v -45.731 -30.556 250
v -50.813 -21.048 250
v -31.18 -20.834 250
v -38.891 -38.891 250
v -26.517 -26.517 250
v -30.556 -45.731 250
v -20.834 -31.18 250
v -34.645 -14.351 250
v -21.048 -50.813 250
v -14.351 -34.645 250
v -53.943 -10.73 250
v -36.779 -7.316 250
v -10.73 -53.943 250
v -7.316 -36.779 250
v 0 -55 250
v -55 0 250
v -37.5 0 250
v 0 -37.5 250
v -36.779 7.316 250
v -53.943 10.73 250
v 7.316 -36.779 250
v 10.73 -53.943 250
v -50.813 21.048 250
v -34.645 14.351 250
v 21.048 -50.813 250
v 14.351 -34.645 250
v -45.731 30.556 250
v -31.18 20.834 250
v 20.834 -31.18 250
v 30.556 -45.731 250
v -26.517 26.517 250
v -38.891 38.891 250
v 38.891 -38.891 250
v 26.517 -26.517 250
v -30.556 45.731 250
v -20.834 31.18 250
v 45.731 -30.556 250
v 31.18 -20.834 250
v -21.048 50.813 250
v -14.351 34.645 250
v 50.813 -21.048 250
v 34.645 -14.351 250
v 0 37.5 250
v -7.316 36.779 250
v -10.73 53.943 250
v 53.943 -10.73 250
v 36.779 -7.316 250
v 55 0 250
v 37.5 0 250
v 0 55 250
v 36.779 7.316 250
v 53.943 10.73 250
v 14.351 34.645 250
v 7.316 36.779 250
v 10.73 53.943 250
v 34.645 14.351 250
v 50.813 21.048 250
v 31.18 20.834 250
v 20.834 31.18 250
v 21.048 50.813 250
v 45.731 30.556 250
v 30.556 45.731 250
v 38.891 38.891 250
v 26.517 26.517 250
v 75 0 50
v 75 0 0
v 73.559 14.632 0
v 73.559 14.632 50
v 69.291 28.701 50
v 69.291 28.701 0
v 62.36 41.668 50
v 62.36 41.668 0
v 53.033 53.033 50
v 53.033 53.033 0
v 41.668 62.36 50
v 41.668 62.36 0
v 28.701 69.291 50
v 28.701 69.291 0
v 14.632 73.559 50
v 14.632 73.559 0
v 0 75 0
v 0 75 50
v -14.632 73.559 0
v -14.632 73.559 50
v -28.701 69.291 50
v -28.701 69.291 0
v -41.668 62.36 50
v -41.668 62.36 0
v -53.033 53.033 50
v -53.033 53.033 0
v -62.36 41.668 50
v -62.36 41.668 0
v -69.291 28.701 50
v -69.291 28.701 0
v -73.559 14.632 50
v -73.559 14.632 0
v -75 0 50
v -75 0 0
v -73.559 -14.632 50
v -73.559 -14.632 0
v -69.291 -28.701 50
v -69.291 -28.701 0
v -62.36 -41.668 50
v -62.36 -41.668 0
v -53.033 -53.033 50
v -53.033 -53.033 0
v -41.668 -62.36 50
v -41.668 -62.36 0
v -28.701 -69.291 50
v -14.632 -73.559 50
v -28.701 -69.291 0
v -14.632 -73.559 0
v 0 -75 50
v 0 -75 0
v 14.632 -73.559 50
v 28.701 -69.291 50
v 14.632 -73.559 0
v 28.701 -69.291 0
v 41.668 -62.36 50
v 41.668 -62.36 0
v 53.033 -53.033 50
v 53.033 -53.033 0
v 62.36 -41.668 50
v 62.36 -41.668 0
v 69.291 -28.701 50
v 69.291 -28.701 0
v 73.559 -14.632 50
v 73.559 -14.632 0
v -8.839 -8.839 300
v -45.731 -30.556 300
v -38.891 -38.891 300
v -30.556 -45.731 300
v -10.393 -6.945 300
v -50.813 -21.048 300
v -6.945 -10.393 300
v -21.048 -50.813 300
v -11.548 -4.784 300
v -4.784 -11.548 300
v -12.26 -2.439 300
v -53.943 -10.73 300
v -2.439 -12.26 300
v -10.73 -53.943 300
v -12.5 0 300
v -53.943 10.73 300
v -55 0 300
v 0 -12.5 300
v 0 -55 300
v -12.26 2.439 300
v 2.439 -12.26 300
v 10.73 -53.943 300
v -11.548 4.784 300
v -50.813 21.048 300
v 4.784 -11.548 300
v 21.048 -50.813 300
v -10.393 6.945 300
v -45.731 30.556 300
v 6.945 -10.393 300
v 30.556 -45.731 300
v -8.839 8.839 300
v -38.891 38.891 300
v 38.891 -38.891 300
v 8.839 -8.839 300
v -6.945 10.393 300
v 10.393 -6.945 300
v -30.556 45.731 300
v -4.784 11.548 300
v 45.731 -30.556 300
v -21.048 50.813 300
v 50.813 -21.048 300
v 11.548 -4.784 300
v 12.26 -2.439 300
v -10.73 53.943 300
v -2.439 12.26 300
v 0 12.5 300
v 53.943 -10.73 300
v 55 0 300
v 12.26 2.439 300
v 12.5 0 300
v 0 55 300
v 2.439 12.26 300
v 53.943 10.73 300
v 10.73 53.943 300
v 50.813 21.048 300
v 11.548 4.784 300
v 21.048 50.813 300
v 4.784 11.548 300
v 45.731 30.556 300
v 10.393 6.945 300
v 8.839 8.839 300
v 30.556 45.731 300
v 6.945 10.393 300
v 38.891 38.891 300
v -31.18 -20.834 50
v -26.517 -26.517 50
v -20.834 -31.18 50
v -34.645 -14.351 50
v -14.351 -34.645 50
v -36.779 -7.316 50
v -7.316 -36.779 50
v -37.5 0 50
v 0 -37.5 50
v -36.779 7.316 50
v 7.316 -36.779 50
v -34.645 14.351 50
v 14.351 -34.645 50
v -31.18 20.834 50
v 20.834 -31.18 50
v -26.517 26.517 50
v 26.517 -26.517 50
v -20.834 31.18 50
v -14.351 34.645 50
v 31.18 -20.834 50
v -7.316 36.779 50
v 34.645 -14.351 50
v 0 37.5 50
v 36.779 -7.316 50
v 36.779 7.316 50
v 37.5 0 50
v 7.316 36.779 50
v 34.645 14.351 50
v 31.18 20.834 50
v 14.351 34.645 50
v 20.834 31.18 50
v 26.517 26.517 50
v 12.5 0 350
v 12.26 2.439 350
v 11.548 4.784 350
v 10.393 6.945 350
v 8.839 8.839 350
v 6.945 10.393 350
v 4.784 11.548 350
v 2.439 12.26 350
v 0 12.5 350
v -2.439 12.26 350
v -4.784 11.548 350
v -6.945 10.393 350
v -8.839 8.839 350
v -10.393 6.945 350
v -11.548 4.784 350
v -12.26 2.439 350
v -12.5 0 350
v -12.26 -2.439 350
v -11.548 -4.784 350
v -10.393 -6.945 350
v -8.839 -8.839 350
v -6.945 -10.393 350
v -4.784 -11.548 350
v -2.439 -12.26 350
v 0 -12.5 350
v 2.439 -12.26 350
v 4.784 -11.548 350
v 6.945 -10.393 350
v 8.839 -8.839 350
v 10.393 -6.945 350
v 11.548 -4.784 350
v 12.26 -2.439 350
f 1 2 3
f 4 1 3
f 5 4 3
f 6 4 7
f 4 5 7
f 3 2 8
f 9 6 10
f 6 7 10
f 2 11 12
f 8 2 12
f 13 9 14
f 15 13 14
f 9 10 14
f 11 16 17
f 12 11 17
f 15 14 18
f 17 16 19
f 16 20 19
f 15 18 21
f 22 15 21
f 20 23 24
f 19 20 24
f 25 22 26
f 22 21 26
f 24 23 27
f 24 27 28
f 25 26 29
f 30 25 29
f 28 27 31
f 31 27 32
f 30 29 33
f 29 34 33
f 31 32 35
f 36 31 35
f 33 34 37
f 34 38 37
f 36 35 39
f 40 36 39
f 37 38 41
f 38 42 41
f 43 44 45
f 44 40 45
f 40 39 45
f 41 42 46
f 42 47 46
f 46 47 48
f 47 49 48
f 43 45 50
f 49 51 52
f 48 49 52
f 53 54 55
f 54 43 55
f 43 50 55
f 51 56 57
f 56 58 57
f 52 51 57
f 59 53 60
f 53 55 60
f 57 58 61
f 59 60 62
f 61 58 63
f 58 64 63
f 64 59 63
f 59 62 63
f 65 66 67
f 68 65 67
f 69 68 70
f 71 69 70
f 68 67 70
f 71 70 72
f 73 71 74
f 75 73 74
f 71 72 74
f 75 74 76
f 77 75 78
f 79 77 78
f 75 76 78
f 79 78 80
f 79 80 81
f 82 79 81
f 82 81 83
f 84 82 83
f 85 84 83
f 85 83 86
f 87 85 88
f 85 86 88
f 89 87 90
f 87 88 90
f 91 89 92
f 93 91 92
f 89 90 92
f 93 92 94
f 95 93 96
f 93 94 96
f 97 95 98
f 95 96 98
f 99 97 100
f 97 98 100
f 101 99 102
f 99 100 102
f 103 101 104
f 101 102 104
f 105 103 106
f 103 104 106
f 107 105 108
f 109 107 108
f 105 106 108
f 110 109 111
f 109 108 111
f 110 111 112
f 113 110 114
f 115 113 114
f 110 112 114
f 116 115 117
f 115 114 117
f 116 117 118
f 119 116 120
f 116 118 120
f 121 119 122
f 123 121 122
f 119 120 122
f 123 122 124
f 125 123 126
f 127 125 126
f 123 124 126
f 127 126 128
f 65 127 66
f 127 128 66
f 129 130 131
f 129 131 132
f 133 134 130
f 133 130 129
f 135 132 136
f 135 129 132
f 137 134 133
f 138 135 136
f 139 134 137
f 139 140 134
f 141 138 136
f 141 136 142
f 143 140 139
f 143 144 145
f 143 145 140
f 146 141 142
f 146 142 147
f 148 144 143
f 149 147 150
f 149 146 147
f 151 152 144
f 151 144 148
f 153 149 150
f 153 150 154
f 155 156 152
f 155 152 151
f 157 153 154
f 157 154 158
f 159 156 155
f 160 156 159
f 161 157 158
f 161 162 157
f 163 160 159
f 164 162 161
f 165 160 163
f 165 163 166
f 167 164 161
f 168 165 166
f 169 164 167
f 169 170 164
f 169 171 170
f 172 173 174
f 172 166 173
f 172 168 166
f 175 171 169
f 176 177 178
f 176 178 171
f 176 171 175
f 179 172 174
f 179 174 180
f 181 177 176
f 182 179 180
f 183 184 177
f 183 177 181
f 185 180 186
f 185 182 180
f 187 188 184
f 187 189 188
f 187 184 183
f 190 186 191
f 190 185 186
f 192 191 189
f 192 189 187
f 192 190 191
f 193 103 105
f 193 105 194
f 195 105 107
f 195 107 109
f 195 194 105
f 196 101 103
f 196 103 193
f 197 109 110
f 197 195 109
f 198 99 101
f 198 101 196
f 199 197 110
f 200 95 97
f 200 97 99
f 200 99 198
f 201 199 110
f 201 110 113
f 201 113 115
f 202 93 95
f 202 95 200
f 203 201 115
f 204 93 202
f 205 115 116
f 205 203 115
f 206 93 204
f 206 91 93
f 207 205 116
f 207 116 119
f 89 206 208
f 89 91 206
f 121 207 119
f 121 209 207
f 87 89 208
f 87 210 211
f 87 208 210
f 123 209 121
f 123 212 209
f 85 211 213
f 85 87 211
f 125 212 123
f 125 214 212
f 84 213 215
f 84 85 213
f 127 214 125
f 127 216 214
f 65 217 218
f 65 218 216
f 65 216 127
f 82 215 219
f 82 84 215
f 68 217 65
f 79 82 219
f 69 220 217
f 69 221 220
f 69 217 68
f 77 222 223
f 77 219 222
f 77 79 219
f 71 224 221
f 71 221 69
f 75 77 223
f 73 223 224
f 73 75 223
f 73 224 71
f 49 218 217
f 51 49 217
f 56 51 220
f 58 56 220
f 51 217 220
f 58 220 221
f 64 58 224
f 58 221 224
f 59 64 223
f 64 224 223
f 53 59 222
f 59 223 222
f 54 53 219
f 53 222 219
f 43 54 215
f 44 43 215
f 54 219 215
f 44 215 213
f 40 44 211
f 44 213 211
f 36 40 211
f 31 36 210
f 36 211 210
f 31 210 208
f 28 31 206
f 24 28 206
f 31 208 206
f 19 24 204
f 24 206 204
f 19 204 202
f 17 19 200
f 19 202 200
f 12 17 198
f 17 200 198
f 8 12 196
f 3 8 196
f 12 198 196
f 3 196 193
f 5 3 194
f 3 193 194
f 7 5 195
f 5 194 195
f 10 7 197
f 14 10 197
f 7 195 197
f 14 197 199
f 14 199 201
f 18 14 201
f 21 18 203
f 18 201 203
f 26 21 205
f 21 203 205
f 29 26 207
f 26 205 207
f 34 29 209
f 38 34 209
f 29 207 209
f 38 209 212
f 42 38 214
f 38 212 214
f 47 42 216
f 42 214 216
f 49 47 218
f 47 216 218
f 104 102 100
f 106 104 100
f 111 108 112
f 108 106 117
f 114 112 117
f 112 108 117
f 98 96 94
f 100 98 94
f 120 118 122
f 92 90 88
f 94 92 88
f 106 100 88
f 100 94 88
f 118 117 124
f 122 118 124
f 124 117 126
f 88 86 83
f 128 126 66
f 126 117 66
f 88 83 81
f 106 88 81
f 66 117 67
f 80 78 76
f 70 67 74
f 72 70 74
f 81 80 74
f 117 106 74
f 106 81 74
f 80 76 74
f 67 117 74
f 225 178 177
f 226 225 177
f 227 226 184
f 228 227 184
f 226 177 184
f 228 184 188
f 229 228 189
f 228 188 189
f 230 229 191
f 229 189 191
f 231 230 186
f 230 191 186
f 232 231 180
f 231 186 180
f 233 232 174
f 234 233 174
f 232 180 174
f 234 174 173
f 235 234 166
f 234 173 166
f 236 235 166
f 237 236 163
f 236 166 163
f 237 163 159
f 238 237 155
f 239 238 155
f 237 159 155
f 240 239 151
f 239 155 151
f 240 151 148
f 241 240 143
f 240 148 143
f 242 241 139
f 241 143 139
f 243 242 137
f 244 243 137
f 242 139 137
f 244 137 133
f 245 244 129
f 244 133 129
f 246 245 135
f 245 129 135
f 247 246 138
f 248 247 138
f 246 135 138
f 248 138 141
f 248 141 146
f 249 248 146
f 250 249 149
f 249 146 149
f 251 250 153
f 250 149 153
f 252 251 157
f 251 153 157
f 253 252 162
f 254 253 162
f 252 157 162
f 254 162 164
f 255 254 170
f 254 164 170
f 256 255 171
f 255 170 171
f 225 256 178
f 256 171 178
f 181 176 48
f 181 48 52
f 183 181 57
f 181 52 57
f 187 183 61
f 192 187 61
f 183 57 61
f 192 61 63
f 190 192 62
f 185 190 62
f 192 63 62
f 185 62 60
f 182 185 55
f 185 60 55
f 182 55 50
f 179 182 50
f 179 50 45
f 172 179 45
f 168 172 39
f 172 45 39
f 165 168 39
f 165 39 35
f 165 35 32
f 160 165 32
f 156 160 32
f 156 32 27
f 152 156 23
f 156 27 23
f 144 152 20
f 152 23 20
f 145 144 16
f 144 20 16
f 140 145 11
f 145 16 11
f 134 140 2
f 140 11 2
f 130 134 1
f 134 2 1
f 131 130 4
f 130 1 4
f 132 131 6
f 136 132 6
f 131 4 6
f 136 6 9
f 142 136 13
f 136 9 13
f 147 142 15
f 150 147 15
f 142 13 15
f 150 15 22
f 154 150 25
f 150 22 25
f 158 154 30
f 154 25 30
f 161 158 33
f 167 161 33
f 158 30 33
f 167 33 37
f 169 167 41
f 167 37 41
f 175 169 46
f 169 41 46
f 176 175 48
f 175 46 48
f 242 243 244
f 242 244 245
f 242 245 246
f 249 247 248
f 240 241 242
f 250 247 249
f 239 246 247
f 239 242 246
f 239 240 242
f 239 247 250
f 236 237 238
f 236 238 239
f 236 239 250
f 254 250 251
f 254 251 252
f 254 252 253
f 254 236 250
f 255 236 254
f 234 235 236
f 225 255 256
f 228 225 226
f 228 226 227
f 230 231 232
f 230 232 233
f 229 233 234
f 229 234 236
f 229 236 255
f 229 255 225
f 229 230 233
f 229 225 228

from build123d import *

# Parameters (mm, degrees)
F0_R     = 75
F1_DEPTH = 50
F2_R     = 37.5
F3_DEPTH = 200
F4_R     = 55
F4_R_2   = 37.5
F5_DEPTH = 50
F6_R     = 12.5
F7_DEPTH = 50


with BuildPart() as f1:
    # F0 (on Top) → F1 (new body)
    with BuildSketch(Plane.XY):
        Circle(F0_R)
    extrude(amount=F1_DEPTH)

    # F2 (on face) → F3 (join)
    with BuildSketch(Plane.XY.offset(50)):
        Circle(F2_R)
    extrude(amount=F3_DEPTH)

    # F4 (on face) → F5 (join)
    with BuildSketch(Plane.XY.offset(250)):
        Circle(F4_R)
        Circle(F4_R_2, mode=Mode.SUBTRACT)
        Circle(F4_R_2)
    extrude(amount=F5_DEPTH)

    # F6 (on face) → F7 (join)
    with BuildSketch(Plane.XY.offset(300)):
        Circle(F6_R)
    extrude(amount=F7_DEPTH)


solid = f1.part
